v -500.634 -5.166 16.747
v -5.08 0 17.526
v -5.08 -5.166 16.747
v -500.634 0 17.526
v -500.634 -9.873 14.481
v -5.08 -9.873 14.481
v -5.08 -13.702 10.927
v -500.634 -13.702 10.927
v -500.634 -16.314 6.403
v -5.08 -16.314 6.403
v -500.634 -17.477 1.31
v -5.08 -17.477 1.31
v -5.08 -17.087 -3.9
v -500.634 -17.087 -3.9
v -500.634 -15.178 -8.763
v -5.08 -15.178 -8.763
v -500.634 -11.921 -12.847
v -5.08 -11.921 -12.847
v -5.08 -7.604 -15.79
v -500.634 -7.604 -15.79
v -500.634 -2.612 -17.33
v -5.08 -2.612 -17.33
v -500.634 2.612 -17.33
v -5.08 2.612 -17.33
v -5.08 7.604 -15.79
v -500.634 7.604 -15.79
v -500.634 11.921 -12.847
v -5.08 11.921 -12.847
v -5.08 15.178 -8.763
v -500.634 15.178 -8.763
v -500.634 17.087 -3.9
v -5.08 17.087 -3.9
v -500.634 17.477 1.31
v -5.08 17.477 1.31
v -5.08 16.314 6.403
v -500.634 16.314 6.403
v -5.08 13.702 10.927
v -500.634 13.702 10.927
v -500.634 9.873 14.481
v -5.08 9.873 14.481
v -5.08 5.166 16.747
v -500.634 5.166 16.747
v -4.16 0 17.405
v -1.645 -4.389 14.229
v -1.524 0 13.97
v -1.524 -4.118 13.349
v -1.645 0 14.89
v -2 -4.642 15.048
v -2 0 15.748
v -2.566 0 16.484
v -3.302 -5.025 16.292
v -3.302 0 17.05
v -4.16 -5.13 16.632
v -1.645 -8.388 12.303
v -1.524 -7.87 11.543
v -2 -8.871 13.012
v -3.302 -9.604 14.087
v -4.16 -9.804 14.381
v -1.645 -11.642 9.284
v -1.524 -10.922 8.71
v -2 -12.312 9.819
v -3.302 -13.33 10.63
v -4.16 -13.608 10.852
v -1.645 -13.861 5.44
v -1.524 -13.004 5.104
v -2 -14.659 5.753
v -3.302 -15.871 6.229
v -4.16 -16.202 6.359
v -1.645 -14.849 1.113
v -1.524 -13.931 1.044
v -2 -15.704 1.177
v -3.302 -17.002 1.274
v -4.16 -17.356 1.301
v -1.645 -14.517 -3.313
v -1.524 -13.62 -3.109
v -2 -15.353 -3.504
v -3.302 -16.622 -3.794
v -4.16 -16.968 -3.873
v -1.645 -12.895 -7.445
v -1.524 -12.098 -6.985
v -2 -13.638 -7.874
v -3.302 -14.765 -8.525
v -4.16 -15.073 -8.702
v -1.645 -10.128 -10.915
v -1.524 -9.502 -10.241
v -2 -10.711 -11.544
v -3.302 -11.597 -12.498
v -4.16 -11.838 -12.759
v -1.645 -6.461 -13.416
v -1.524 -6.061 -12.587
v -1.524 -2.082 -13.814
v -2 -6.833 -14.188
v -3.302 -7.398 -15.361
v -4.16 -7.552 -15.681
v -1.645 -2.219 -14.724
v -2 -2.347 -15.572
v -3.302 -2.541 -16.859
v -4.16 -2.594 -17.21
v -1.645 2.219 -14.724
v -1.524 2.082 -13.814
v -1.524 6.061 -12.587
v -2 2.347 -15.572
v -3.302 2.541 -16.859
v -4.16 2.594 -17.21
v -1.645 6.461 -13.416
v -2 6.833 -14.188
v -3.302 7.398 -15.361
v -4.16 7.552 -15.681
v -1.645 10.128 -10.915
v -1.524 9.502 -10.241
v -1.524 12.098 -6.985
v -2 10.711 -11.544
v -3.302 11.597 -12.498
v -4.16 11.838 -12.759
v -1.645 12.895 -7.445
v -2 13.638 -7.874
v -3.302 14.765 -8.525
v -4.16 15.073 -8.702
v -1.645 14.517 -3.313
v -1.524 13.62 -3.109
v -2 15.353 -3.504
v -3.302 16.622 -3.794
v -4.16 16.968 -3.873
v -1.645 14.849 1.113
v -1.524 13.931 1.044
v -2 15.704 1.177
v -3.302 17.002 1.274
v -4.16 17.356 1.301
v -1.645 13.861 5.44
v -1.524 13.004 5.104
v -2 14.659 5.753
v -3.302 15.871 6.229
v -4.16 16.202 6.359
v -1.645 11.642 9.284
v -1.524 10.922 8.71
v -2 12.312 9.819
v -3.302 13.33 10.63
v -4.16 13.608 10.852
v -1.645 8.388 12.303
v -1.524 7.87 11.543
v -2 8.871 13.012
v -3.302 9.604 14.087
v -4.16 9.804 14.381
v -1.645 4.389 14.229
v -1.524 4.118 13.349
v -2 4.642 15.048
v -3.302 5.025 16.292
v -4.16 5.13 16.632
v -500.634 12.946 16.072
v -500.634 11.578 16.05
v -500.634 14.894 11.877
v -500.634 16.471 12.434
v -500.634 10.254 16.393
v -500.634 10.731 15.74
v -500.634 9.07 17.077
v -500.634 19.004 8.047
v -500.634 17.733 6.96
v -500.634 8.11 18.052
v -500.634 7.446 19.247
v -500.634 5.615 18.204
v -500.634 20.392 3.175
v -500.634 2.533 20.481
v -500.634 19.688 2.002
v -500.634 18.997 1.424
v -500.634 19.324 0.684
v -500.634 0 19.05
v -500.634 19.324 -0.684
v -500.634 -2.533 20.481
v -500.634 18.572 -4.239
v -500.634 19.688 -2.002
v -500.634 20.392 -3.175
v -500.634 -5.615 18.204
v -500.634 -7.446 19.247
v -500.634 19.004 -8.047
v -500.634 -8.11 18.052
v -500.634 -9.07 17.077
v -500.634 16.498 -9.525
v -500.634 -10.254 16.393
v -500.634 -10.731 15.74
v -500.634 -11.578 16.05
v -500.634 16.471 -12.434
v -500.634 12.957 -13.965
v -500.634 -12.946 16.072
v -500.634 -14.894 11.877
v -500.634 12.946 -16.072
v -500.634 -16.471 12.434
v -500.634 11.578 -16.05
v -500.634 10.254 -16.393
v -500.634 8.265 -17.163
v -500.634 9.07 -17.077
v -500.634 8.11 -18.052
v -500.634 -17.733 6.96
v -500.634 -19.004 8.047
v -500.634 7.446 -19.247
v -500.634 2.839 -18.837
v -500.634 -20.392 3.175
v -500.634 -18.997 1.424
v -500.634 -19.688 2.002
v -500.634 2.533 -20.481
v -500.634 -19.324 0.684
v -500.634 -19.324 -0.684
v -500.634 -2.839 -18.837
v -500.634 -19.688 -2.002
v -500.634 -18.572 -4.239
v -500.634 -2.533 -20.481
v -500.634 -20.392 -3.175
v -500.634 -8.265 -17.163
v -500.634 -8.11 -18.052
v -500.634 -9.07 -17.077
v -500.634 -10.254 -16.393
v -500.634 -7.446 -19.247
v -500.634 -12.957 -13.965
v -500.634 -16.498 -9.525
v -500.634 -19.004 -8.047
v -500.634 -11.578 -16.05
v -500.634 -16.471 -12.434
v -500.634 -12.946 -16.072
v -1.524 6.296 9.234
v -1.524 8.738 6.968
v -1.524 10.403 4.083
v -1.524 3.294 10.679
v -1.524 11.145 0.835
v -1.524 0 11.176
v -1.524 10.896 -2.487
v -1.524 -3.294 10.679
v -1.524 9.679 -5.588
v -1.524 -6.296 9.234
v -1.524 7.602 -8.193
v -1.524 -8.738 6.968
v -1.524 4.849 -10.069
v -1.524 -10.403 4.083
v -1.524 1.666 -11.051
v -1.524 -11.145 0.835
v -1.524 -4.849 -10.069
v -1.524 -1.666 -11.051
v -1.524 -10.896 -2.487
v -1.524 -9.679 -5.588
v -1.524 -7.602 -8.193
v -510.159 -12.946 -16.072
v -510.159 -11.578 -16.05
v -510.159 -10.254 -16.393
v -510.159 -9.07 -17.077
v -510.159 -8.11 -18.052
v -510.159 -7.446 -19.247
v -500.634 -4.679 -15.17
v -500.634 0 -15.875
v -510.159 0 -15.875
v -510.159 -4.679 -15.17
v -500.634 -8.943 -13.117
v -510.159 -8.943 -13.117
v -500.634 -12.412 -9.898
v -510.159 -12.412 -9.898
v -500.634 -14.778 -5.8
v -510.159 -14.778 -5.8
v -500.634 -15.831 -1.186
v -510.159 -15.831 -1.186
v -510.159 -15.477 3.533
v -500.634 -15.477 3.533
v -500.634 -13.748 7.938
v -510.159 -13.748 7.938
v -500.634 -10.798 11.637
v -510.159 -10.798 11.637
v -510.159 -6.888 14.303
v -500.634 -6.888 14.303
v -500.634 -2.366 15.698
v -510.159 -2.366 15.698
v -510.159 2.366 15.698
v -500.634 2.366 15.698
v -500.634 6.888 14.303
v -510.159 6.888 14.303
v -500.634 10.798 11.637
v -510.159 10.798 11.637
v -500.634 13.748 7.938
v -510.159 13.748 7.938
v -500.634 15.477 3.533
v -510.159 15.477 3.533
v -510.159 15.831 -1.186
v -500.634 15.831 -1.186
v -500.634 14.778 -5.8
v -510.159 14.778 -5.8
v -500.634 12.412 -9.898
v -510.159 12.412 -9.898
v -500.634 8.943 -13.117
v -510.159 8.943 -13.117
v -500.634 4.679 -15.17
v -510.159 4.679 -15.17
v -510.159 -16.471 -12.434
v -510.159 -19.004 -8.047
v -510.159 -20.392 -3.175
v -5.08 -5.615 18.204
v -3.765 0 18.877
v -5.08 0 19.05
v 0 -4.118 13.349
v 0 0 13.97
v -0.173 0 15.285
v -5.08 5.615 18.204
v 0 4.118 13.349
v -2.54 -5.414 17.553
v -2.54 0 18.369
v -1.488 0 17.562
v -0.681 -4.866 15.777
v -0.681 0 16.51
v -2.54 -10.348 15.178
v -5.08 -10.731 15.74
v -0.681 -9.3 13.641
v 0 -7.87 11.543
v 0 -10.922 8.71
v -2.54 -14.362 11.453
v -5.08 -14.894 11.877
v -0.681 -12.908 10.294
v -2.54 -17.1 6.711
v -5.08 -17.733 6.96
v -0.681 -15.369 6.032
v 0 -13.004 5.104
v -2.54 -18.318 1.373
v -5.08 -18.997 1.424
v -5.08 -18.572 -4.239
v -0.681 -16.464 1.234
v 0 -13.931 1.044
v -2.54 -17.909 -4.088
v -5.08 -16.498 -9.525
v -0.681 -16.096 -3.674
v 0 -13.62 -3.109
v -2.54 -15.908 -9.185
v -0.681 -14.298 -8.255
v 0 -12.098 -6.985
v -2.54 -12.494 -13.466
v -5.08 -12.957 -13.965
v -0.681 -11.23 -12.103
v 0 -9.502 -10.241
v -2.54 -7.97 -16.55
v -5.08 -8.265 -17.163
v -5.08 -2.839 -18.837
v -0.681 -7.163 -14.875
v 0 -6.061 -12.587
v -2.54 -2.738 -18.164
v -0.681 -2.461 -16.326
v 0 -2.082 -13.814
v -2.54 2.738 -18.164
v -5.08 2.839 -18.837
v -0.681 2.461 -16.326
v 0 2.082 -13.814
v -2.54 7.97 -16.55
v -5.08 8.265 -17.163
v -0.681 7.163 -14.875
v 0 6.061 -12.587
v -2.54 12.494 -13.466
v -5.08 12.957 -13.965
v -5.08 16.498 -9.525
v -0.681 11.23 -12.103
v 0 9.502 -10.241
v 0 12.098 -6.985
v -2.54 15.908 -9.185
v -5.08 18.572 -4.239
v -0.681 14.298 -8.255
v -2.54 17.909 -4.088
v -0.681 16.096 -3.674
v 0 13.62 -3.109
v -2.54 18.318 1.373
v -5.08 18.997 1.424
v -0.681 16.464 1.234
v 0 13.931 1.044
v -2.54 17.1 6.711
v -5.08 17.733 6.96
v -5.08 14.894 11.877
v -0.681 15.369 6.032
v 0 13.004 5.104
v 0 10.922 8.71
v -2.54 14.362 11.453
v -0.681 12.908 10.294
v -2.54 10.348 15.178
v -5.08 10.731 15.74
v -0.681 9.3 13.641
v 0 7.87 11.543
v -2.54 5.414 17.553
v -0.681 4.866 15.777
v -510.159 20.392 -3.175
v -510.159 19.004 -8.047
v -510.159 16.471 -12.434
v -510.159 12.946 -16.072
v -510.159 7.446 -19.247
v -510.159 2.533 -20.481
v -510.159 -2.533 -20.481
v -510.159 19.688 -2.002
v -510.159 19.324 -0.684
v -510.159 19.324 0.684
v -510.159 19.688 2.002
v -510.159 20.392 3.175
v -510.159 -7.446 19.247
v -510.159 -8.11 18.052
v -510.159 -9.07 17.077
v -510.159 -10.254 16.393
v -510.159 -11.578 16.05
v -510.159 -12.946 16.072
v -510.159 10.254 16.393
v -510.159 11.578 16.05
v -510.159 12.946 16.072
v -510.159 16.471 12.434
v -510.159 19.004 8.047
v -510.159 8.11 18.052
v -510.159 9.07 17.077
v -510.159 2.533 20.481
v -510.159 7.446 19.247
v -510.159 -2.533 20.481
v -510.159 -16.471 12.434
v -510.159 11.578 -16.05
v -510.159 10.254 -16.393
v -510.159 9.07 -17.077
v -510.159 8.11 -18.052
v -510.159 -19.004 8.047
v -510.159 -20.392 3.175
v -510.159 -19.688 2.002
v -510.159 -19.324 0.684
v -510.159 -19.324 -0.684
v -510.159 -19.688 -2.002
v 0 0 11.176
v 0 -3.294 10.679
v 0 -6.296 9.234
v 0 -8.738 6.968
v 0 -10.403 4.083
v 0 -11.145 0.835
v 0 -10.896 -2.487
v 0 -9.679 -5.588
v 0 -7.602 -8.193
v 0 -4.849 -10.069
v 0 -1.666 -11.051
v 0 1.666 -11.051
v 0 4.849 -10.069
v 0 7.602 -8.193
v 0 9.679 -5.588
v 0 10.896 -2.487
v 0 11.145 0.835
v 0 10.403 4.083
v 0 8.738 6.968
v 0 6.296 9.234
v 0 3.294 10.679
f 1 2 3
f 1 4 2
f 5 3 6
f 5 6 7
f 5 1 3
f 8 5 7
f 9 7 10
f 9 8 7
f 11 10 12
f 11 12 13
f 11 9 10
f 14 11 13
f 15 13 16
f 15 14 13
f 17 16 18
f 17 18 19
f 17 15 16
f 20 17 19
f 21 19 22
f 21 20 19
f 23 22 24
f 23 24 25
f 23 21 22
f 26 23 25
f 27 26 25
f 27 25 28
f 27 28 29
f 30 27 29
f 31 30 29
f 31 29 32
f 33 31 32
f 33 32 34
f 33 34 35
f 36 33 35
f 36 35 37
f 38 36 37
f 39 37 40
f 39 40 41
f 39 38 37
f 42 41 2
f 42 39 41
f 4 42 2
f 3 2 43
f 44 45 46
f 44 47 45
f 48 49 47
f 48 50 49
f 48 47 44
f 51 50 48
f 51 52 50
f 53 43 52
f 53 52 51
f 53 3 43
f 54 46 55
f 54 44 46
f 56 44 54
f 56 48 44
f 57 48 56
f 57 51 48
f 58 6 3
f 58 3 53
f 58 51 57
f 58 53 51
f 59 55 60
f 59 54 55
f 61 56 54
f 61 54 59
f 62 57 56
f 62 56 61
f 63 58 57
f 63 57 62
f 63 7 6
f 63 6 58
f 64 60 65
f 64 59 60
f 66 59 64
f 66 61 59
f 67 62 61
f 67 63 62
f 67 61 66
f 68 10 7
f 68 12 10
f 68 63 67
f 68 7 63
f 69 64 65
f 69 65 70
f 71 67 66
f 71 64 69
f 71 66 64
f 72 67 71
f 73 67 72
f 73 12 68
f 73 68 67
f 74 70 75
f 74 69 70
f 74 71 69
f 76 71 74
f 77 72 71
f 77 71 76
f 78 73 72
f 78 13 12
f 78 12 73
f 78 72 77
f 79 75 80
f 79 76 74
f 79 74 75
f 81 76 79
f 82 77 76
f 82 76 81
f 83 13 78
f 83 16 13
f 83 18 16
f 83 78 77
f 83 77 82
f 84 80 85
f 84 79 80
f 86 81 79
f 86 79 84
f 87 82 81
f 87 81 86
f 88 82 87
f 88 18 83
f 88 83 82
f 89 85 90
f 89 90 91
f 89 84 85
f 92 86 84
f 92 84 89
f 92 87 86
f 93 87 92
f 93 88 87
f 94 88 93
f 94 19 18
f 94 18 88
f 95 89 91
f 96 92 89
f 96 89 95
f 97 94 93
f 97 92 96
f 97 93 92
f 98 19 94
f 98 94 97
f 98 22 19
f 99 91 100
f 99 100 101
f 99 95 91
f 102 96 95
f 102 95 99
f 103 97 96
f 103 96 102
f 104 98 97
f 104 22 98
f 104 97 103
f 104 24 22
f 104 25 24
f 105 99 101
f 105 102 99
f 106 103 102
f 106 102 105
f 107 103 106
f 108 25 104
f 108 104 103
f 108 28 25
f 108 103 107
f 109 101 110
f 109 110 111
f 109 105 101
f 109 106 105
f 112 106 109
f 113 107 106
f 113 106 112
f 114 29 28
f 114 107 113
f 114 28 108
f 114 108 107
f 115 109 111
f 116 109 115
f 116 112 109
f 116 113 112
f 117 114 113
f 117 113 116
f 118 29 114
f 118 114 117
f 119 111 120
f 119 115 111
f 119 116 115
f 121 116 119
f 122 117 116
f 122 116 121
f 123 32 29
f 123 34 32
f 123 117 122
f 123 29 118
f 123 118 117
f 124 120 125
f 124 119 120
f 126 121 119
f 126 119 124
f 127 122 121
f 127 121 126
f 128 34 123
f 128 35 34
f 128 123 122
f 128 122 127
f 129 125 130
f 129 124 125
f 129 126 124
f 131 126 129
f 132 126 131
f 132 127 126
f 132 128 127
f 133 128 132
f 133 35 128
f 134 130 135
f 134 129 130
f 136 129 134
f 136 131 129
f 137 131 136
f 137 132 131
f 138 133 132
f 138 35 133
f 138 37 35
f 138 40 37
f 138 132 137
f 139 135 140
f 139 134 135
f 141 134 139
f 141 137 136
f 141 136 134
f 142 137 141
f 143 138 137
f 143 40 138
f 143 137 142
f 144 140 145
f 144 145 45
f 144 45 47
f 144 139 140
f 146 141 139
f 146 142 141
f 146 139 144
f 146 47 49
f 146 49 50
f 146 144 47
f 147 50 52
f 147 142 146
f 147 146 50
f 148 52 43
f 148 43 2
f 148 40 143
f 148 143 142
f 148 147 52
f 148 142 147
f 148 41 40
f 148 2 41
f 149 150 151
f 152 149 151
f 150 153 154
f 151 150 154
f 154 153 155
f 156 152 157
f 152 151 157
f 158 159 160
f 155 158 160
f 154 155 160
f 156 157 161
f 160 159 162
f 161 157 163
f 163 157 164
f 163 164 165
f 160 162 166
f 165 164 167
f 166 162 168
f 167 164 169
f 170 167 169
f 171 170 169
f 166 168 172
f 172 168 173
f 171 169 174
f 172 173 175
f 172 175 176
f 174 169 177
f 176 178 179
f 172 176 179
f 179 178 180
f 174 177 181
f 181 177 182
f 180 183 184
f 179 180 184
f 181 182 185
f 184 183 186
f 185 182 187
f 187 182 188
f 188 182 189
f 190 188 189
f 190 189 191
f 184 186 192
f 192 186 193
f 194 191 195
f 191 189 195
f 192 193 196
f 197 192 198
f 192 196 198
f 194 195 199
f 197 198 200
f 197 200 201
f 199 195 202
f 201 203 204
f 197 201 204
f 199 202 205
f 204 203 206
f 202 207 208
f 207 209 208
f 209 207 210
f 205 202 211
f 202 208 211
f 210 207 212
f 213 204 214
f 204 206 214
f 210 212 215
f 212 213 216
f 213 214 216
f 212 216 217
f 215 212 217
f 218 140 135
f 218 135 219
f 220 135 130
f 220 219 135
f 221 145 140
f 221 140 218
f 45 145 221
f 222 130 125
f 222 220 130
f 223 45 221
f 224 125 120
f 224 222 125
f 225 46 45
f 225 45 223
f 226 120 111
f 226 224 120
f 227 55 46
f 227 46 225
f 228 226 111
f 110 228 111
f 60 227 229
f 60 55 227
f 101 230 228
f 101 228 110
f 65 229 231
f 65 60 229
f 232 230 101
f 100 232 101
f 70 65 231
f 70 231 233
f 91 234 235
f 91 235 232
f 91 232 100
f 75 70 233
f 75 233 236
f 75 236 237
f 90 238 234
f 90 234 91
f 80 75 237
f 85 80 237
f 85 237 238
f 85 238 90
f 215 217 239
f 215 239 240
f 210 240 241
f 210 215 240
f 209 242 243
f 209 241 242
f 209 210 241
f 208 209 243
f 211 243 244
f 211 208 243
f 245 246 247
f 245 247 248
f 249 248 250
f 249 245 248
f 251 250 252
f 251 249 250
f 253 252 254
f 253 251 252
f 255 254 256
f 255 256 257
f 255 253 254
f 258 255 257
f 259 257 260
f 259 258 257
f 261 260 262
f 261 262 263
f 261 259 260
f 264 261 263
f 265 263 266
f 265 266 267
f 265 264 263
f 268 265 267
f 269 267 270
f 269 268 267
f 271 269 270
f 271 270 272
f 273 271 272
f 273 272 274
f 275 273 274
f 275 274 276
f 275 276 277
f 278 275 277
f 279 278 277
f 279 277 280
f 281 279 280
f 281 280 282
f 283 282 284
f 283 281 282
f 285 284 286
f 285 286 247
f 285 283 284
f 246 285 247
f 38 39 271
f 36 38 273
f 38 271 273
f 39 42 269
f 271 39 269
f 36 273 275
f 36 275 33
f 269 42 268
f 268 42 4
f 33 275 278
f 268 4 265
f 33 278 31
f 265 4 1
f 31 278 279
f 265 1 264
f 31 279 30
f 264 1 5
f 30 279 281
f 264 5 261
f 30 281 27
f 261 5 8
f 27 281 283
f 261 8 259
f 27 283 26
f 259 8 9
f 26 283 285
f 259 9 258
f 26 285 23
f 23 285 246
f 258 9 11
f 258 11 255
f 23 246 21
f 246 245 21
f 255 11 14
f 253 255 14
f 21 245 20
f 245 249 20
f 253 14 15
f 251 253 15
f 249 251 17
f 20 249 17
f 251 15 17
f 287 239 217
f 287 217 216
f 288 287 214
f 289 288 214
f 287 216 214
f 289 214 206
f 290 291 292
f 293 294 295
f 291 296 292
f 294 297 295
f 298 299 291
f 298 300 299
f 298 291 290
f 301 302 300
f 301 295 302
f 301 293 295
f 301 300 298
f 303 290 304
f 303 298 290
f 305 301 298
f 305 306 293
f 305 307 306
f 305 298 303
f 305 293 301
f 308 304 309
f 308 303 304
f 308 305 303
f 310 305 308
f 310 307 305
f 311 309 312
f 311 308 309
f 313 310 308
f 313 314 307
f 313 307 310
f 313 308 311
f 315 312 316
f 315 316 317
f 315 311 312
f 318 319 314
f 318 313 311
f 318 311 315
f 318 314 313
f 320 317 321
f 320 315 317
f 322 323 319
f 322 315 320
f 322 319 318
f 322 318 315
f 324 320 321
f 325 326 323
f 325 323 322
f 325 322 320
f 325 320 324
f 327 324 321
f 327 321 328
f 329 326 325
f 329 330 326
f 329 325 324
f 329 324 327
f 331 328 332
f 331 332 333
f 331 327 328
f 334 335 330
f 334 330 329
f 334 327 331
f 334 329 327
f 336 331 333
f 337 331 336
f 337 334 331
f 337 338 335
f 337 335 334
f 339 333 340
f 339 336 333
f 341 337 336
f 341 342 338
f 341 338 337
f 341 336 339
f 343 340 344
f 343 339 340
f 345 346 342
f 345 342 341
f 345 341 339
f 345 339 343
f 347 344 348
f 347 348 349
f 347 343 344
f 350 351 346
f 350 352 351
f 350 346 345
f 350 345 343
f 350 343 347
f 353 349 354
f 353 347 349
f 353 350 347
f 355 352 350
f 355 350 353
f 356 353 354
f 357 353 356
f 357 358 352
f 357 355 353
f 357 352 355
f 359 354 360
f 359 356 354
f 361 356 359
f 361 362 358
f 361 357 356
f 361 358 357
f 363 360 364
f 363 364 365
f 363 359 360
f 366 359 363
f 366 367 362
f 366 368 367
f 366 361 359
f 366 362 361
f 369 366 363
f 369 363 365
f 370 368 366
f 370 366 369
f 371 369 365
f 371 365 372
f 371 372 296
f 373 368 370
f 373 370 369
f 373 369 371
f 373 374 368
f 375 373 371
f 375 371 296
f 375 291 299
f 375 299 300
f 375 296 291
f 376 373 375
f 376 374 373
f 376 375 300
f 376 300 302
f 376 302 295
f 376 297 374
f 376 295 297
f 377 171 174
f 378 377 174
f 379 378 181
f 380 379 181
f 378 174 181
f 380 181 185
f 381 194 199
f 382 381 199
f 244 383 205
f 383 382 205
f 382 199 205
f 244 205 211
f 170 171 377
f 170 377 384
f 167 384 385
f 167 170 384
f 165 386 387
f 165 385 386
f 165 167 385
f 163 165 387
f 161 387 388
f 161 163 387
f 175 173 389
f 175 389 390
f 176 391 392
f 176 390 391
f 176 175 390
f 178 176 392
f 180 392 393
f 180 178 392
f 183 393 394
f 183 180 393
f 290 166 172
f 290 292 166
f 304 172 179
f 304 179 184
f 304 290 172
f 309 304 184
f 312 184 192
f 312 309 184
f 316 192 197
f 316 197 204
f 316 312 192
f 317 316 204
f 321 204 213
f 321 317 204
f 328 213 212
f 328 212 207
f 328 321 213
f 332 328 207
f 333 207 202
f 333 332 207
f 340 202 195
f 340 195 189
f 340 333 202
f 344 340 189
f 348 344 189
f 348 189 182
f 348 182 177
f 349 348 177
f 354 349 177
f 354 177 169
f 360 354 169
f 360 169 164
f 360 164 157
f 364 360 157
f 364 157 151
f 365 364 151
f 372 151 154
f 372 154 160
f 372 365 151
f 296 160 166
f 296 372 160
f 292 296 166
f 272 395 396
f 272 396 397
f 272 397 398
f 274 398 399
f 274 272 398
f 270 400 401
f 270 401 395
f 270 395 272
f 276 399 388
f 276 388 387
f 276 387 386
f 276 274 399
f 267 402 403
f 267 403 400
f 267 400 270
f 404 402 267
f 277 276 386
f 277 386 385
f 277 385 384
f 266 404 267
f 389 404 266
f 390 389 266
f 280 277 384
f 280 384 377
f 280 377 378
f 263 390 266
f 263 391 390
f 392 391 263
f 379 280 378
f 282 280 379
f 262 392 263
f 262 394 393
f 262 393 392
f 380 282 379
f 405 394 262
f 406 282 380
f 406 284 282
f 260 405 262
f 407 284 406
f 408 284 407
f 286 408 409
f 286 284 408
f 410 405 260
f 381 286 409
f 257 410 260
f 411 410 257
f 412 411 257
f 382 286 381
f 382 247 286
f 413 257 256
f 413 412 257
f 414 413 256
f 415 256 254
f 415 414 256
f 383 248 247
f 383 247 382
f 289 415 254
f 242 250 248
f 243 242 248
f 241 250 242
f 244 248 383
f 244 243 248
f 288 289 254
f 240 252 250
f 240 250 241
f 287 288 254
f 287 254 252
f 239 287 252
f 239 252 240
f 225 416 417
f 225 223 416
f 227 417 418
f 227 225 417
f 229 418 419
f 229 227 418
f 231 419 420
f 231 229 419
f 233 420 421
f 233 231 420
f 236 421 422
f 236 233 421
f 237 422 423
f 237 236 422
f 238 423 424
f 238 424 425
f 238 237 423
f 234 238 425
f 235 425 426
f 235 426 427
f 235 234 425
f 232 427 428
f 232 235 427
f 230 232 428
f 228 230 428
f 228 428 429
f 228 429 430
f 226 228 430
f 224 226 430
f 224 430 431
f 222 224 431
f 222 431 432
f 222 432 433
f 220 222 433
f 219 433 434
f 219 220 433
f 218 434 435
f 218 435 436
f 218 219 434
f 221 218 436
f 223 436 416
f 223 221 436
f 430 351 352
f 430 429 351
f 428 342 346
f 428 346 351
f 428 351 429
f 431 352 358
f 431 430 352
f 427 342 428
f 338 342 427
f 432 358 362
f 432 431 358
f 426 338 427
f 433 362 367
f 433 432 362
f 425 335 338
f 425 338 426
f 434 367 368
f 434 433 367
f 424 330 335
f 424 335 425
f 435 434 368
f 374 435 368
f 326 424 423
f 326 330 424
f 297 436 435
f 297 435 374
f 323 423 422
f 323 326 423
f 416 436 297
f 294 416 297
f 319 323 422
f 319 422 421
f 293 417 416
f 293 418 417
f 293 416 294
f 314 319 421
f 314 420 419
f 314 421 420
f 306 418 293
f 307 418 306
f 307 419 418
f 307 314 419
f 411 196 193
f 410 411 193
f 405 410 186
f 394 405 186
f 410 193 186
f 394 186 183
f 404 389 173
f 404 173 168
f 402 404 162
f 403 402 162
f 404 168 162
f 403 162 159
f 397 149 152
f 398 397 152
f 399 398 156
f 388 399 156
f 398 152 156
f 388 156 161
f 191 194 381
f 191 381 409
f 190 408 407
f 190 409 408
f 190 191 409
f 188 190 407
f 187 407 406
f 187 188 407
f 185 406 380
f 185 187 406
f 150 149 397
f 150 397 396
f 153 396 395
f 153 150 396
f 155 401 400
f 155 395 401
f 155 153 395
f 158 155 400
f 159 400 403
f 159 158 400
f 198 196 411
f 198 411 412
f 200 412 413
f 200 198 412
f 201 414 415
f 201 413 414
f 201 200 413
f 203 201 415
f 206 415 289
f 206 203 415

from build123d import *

# Parameters (mm, degrees)
SKETCH2_R               = 20.6375
SKETCH2_R_2             = 15.875
BOSS_EXTRUDE1_DEPTH     = 9.525
CUT_EXTRUDE1_DEPTH      = 511.993168343
CUT_EXTRUDE1_DEPTH_BACK = 511.993168343


with BuildPart() as part:
    # Sketch1 → Revolve1 (revolve)
    with BuildSketch(Plane.XY, mode=Mode.PRIVATE) as revolve1_sk:
        with BuildLine():
            Line((-5.08, 17.526), (-500.634, 17.526))
            Line((-500.634, 17.526), (-500.634, 19.05))
            Line((-500.634, 19.05), (-5.08, 19.05))
            ThreePointArc((-5.08, 19.05), (-1.487897552, 17.562102448), (0, 13.97))
            Line((0, 13.97), (0, 11.176))
            Line((0, 11.176), (-1.524, 11.176))
            Line((-1.524, 11.176), (-1.524, 13.97))
            ThreePointArc((-1.524, 13.97), (-2.565528286, 16.484471714), (-5.08, 17.526))
        make_face()
    revolve(revolve1_sk.sketch.rotate(Axis((-484.828271433, 0, 0), (1, 0, 0)), 90), axis=Axis((-484.828271433, 0, 0), (1, 0, 0)))

    # Sketch2 → Boss-Extrude1 (add)
    with BuildSketch(Plane.ZY.offset(500.634)):
        with Locations(Location((0, 0, 0), (0, 0, 180))):
            Circle(SKETCH2_R)
        with Locations(Location((0, 0, 0), (0, 0, 180))):
            Circle(SKETCH2_R_2, mode=Mode.SUBTRACT)
    extrude(amount=BOSS_EXTRUDE1_DEPTH)

    # Sketch4 → Cut-Extrude1 (cut, two sides: drawn at the far end of the back side and taken through both)
    with BuildSketch(Plane.ZY.offset(510.159).offset(-CUT_EXTRUDE1_DEPTH_BACK)):
        with BuildLine():
            ThreePointArc((3.175, 20.391806719), (0, 20.6375), (-3.175, 20.391806719))
            ThreePointArc((-3.175, 20.391806719), (0, 19.277380448), (3.175, 20.391806719))
        make_face()
        with BuildLine():
            ThreePointArc((19.247322647, 7.446272702), (17.872599271, 10.31875), (16.072322647, 12.945534016))
            ThreePointArc((16.072322647, 12.945534016), (16.694701186, 9.638690224), (19.247322647, 7.446272702))
        make_face()
        with BuildLine():
            ThreePointArc((16.072322647, -12.945534016), (17.872599271, -10.31875), (19.247322647, -7.446272702))
            ThreePointArc((19.247322647, -7.446272702), (16.694701186, -9.638690224), (16.072322647, -12.945534016))
        make_face()
        with BuildLine():
            ThreePointArc((-3.175, -20.391806719), (0, -20.6375), (3.175, -20.391806719))
            ThreePointArc((3.175, -20.391806719), (0, -19.277380448), (-3.175, -20.391806719))
        make_face()
        with BuildLine():
            ThreePointArc((-19.247322647, -7.446272702), (-17.872599271, -10.31875), (-16.072322647, -12.945534016))
            ThreePointArc((-16.072322647, -12.945534016), (-16.694701186, -9.638690224), (-19.247322647, -7.446272702))
        make_face()
        with BuildLine():
            ThreePointArc((-16.072322647, 12.945534016), (-17.872599271, 10.31875), (-19.247322647, 7.446272702))
            ThreePointArc((-19.247322647, 7.446272702), (-16.694701186, 9.638690224), (-16.072322647, 12.945534016))
        make_face()
    extrude(amount=CUT_EXTRUDE1_DEPTH + CUT_EXTRUDE1_DEPTH_BACK, mode=Mode.SUBTRACT)


solid = part.part
